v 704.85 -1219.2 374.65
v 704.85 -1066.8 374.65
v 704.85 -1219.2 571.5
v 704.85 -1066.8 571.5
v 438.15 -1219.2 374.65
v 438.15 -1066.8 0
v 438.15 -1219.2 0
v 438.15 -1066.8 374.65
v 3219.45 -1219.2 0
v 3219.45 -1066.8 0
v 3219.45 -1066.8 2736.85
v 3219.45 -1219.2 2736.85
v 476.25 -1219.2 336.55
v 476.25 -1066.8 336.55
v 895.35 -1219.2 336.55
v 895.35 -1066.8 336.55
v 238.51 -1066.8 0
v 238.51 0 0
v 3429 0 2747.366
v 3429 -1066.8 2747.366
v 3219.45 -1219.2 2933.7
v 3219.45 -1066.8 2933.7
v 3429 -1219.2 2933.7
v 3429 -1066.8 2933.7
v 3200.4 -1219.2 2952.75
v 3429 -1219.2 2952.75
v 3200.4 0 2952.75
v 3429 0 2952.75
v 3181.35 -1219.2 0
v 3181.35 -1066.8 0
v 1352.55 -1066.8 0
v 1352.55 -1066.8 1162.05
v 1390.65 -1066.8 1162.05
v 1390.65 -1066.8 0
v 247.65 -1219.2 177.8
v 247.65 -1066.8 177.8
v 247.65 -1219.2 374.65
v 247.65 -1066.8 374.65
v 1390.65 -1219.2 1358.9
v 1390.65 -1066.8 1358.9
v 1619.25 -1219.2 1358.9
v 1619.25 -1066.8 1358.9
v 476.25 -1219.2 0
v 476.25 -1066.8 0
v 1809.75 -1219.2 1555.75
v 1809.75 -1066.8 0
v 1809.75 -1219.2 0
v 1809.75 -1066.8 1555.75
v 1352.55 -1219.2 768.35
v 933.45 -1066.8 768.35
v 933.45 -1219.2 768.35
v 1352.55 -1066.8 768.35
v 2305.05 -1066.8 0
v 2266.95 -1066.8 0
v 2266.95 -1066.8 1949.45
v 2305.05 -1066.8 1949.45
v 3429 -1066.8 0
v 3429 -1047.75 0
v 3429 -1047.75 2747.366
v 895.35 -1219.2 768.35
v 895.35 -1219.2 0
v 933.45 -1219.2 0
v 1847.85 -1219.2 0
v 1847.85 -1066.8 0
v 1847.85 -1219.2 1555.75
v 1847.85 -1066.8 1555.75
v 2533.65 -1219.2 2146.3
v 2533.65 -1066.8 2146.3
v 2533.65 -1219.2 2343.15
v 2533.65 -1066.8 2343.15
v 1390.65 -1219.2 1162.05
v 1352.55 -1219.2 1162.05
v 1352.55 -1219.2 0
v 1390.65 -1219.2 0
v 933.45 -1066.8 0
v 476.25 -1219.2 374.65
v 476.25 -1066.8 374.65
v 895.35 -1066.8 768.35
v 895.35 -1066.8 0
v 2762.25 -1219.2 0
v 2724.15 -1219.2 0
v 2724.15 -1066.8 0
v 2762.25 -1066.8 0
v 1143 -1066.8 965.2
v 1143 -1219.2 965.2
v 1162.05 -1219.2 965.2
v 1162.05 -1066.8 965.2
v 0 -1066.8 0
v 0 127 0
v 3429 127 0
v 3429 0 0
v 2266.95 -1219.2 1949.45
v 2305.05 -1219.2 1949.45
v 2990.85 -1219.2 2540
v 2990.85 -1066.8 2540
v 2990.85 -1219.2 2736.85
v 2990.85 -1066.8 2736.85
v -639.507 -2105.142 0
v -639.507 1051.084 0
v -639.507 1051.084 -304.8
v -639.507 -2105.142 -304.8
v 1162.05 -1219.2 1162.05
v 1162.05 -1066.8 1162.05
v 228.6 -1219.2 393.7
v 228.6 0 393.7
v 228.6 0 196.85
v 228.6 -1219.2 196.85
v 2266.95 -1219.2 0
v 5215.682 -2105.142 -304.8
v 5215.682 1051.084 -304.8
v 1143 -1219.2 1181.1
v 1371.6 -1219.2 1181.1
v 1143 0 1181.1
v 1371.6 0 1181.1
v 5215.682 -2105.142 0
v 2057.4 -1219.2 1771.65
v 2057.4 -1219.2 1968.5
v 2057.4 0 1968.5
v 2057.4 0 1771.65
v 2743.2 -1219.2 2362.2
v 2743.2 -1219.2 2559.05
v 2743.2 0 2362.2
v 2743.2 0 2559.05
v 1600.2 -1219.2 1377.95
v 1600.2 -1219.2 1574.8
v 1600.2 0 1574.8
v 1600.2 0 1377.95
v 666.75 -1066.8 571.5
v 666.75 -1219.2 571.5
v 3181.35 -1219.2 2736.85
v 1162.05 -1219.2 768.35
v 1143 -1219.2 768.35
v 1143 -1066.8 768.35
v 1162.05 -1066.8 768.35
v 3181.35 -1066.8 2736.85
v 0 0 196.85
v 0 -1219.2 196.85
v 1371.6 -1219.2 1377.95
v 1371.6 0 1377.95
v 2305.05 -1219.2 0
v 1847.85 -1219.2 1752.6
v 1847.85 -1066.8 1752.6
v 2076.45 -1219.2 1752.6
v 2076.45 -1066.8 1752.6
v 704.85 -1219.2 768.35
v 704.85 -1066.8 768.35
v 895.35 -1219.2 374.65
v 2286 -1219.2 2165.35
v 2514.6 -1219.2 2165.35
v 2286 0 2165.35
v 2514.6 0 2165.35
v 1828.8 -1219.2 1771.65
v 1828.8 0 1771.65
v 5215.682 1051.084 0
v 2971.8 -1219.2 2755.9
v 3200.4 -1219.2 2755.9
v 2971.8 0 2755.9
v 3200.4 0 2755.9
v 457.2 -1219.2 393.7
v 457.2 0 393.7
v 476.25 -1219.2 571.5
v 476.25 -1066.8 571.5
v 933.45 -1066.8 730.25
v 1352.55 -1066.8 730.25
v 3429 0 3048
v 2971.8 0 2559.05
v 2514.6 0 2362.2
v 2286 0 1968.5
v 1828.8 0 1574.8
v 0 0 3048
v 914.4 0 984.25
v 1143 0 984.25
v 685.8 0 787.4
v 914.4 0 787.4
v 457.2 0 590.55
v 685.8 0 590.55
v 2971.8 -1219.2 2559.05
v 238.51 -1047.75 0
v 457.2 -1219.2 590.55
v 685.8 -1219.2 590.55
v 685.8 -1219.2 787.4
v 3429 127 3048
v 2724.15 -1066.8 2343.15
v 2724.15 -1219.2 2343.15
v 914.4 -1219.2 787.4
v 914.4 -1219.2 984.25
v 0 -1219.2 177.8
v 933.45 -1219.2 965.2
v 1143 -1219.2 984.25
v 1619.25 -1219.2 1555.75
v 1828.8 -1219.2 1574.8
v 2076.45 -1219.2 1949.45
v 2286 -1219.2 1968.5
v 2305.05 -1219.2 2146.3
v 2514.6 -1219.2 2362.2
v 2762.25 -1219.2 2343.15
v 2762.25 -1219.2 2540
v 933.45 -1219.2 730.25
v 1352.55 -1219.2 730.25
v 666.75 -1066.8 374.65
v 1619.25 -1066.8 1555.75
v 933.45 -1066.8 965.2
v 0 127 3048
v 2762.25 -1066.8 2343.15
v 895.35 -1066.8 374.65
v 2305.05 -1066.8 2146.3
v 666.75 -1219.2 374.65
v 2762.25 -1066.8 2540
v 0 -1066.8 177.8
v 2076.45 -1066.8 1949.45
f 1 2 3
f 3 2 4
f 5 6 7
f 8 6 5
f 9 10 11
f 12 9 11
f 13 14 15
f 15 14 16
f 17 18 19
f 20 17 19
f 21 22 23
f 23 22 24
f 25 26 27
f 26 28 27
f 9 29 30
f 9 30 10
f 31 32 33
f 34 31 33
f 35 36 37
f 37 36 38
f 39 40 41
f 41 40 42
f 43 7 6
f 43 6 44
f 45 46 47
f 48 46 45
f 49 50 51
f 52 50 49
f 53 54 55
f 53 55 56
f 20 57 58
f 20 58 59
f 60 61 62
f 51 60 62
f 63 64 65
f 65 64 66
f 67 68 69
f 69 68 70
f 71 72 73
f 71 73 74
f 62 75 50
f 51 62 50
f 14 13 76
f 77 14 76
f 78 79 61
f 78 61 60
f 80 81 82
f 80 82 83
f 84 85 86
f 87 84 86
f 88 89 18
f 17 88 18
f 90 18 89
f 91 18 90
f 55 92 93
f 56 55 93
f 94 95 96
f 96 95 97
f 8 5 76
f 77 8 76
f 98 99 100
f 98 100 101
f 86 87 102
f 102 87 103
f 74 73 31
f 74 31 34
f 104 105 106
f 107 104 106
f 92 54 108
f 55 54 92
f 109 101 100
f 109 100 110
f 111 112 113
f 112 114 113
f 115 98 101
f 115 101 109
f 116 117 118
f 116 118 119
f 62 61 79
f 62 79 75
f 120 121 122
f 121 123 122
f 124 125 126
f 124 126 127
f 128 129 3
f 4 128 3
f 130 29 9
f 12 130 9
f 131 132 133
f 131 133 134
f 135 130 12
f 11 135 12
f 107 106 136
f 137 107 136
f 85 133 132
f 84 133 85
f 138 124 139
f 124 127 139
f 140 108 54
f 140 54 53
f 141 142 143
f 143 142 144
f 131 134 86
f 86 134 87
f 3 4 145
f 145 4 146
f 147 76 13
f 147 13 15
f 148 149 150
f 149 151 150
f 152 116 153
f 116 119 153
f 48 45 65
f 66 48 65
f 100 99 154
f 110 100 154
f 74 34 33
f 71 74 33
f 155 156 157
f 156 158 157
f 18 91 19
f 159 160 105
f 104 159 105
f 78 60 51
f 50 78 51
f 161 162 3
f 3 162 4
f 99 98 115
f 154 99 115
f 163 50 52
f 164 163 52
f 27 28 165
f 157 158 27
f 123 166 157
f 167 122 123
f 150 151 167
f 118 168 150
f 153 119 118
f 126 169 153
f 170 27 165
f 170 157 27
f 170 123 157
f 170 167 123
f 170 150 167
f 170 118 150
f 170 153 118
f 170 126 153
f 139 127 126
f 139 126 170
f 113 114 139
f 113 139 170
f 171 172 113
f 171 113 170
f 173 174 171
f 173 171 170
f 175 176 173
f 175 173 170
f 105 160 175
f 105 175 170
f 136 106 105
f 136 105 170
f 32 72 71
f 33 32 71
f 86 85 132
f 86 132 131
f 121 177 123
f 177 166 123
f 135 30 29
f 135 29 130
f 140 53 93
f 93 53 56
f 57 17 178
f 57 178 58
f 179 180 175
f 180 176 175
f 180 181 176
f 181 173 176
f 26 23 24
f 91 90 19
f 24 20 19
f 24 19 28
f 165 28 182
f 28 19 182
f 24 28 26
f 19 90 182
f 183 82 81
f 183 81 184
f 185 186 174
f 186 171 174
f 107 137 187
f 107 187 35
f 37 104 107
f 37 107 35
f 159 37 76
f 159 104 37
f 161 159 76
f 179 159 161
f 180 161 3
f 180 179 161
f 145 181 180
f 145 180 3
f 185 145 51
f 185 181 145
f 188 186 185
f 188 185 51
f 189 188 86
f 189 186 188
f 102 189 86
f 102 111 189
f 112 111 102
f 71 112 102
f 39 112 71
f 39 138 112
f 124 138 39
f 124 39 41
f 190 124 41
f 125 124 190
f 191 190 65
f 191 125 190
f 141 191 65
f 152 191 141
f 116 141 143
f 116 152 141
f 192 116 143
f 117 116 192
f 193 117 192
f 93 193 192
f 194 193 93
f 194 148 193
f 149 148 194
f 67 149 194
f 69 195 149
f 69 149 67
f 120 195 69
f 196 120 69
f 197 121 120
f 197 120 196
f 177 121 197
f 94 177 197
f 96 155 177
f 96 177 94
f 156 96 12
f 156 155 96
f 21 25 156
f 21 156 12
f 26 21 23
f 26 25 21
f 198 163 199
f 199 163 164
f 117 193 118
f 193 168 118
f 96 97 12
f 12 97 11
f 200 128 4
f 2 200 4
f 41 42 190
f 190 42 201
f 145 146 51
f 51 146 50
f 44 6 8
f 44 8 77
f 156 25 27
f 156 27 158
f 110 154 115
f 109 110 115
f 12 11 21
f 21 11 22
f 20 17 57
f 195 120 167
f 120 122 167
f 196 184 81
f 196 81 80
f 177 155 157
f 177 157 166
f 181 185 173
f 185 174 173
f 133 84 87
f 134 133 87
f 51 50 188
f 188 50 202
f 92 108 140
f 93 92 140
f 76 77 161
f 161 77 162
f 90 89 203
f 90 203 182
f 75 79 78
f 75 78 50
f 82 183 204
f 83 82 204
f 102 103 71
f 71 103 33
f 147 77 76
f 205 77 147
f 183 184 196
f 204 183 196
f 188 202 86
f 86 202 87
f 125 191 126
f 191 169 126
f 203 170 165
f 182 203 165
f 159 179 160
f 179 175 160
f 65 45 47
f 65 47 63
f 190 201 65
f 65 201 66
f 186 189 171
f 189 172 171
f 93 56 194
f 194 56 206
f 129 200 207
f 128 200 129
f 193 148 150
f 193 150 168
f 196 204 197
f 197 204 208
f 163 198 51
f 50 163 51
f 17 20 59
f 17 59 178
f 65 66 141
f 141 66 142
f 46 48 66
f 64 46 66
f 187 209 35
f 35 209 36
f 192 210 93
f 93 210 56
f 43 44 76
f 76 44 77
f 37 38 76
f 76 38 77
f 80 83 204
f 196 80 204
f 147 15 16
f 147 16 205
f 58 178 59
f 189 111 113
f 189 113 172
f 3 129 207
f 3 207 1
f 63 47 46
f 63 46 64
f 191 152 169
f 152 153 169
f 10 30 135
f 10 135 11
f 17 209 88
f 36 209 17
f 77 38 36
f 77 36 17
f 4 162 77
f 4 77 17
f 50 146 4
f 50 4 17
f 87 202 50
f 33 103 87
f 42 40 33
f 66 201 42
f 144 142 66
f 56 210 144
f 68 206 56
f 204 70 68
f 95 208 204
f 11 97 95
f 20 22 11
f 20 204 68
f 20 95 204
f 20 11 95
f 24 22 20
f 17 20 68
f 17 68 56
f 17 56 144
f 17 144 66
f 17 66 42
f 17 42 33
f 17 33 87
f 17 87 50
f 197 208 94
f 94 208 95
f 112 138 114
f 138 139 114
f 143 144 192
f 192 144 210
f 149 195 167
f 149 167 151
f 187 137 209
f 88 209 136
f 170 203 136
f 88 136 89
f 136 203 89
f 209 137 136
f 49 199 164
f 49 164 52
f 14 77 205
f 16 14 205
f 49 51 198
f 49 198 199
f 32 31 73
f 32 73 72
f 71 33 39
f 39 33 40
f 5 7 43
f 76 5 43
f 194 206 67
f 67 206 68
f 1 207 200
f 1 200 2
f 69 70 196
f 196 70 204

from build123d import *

# Parameters (mm, degrees)
F1_DEPTH  = 1066.8
F3_DEPTH  = 3048
F5_DEPTH  = 19.05
F8_DEPTH  = 152.4
F9_W      = 38.1
F9_H      = 374.65
F10_DEPTH = 152.4
F9_H_2    = 768.35
F9_H_3    = 1162.05
F9_H_4    = 1555.75
F9_H_5    = 1949.45
F9_H_6    = 2343.15
F9_H_7    = 2736.85
F11_W     = 419.1
F11_H     = 38.1
F12_DEPTH = 152.4
F13_W     = 5855.1892638206
F13_H     = 3156.2256813049
F14_DEPTH = 304.8
F15_W     = 38.1
F15_H     = 196.85
F16_DEPTH = 152.4
F15_W_2   = 19.05


with BuildPart() as f1:
    # F0 (on Front) → F1 (new body)
    with BuildSketch(Plane.XZ):
        Polygon((0, 196.85), (0, 0), (238.5098747049, 0), (3429, 2747.3664967819), (3429, 2952.75), (3200.4, 2952.75), (3200.4, 2755.9), (2971.8, 2755.9), (2971.8, 2559.05), (2743.2, 2559.05), (2743.2, 2362.2), (2514.6, 2362.2), (2514.6, 2165.35), (2286, 2165.35), (2286, 1968.5), (2057.4, 1968.5), (2057.4, 1771.65), (1828.8, 1771.65), (1828.8, 1574.8), (1600.2, 1574.8), (1600.2, 1377.95), (1371.6, 1377.95), (1371.6, 1181.1), (1143, 1181.1), (1143, 984.25), (914.4, 984.25), (914.4, 787.4), (685.8, 787.4), (685.8, 590.55), (457.2, 590.55), (457.2, 393.7), (228.6, 393.7), (228.6, 196.85), align=None)
    extrude(amount=F1_DEPTH)

    # F2 (on face) → F3 (join)
    with BuildSketch(Plane(origin=(0, 0, 0), x_dir=(1, 0, 0), z_dir=(0, 0, -1))):
        Polygon((238.5098747049, 0), (0, 0), (0, -127), (3429, -127), (3429, 0), align=None)
    extrude(amount=-F3_DEPTH)

    # F7 (on face) → F8 (join)
    with BuildSketch(Plane.XZ.offset(1066.8)):
        Polygon((228.6, 196.85), (0, 196.85), (0, 177.8), (247.65, 177.8), (247.65, 374.65), (476.25, 374.65), (476.25, 571.5), (704.85, 571.5), (704.85, 768.35), (933.45, 768.35), (933.45, 965.2), (1162.05, 965.2), (1162.05, 1162.05), (1390.65, 1162.05), (1390.65, 1358.9), (1619.25, 1358.9), (1619.25, 1555.75), (1847.85, 1555.75), (1847.85, 1752.6), (2076.45, 1752.6), (2076.45, 1949.45), (2305.05, 1949.45), (2305.05, 2146.3), (2533.65, 2146.3), (2533.65, 2343.15), (2762.25, 2343.15), (2762.25, 2540), (2990.85, 2540), (2990.85, 2736.85), (3219.45, 2736.85), (3219.45, 2933.7), (3429, 2933.7), (3429, 2952.75), (3200.4, 2952.75), (3200.4, 2755.9), (2971.8, 2755.9), (2971.8, 2559.05), (2743.2, 2559.05), (2743.2, 2362.2), (2514.6, 2362.2), (2514.6, 2165.35), (2286, 2165.35), (2286, 1968.5), (2057.4, 1968.5), (2057.4, 1771.65), (1828.8, 1771.65), (1828.8, 1574.8), (1600.2, 1574.8), (1600.2, 1377.95), (1371.6, 1377.95), (1371.6, 1181.1), (1143, 1181.1), (1143, 984.25), (914.4, 984.25), (914.4, 787.4), (685.8, 787.4), (685.8, 590.55), (457.2, 590.55), (457.2, 393.7), (228.6, 393.7), align=None)
    extrude(amount=F8_DEPTH)


with BuildPart() as f5:
    # F4 (on face) → F5 (new body)
    with BuildSketch(Plane.XZ.offset(1066.8)):
        Polygon((3429, 2747.3664967819), (238.5098747049, 0), (3429, 0), align=None)
    extrude(amount=-F5_DEPTH)


with BuildPart() as f10:
    # F9 (on face) → F10 (new body)
    with BuildSketch(Plane.XZ.offset(1066.8)):
        with Locations((457.2, 187.325)):
            Rectangle(F9_W, F9_H)
    extrude(amount=F10_DEPTH)


with BuildPart() as f10b:
    # F9 (on face) → F10, piece 2 (new body)
    with BuildSketch(Plane.XZ.offset(1066.8)):
        with Locations((914.4, 384.175)):
            Rectangle(F9_W, F9_H_2)
    extrude(amount=F10_DEPTH)


with BuildPart() as f10c:
    # F9 (on face) → F10, piece 3 (new body)
    with BuildSketch(Plane.XZ.offset(1066.8)):
        with Locations((1371.6, 581.025)):
            Rectangle(F9_W, F9_H_3)
    extrude(amount=F10_DEPTH)


with BuildPart() as f10d:
    # F9 (on face) → F10, piece 4 (new body)
    with BuildSketch(Plane.XZ.offset(1066.8)):
        with Locations((1828.8, 777.875)):
            Rectangle(F9_W, F9_H_4)
    extrude(amount=F10_DEPTH)


with BuildPart() as f10e:
    # F9 (on face) → F10, piece 5 (new body)
    with BuildSketch(Plane.XZ.offset(1066.8)):
        with Locations((2286, 974.725)):
            Rectangle(F9_W, F9_H_5)
    extrude(amount=F10_DEPTH)


with BuildPart() as f10f:
    # F9 (on face) → F10, piece 6 (new body)
    with BuildSketch(Plane.XZ.offset(1066.8)):
        with Locations((2743.2, 1171.575)):
            Rectangle(F9_W, F9_H_6)
    extrude(amount=F10_DEPTH)


with BuildPart() as f10g:
    # F9 (on face) → F10, piece 7 (new body)
    with BuildSketch(Plane.XZ.offset(1066.8)):
        with Locations((3200.4, 1368.425)):
            Rectangle(F9_W, F9_H_7)
    extrude(amount=F10_DEPTH)


with BuildPart() as f12:
    # F11 (on face) → F12 (new body)
    with BuildSketch(Plane.XZ.offset(1066.8)):
        with Locations((685.8, 355.6)):
            Rectangle(F11_W, F11_H)
    extrude(amount=F12_DEPTH)


with BuildPart() as f12b:
    # F11 (on face) → F12, piece 2 (new body)
    with BuildSketch(Plane.XZ.offset(1066.8)):
        with Locations((1143, 749.3)):
            Rectangle(F11_W, F11_H)
    extrude(amount=F12_DEPTH)


with BuildPart() as f14:
    # F13 (on face) → F14 (new body)
    with BuildSketch(Plane(origin=(0, 0, 0), x_dir=(1, 0, 0), z_dir=(0, 0, -1))):
        with Locations((2288.0873978138, 527.0290374756)):
            Rectangle(F13_W, F13_H)
    extrude(amount=F14_DEPTH)


with BuildPart() as f16:
    # F15 (on face) → F16 (new body)
    with BuildSketch(Plane.XZ.offset(1066.8)):
        with Locations((685.8, 473.075)):
            Rectangle(F15_W, F15_H)
    extrude(amount=F16_DEPTH)


with BuildPart() as f16b:
    # F15 (on face) → F16, piece 2 (new body)
    with BuildSketch(Plane.XZ.offset(1066.8)):
        with Locations((1152.525, 866.775)):
            Rectangle(F15_W_2, F15_H)
    extrude(amount=F16_DEPTH)


solid = Compound([f1.part, f5.part, f10.part, f10b.part, f10c.part, f10d.part, f10e.part, f10f.part, f10g.part, f12.part, f12b.part, f14.part, f16.part, f16b.part])
